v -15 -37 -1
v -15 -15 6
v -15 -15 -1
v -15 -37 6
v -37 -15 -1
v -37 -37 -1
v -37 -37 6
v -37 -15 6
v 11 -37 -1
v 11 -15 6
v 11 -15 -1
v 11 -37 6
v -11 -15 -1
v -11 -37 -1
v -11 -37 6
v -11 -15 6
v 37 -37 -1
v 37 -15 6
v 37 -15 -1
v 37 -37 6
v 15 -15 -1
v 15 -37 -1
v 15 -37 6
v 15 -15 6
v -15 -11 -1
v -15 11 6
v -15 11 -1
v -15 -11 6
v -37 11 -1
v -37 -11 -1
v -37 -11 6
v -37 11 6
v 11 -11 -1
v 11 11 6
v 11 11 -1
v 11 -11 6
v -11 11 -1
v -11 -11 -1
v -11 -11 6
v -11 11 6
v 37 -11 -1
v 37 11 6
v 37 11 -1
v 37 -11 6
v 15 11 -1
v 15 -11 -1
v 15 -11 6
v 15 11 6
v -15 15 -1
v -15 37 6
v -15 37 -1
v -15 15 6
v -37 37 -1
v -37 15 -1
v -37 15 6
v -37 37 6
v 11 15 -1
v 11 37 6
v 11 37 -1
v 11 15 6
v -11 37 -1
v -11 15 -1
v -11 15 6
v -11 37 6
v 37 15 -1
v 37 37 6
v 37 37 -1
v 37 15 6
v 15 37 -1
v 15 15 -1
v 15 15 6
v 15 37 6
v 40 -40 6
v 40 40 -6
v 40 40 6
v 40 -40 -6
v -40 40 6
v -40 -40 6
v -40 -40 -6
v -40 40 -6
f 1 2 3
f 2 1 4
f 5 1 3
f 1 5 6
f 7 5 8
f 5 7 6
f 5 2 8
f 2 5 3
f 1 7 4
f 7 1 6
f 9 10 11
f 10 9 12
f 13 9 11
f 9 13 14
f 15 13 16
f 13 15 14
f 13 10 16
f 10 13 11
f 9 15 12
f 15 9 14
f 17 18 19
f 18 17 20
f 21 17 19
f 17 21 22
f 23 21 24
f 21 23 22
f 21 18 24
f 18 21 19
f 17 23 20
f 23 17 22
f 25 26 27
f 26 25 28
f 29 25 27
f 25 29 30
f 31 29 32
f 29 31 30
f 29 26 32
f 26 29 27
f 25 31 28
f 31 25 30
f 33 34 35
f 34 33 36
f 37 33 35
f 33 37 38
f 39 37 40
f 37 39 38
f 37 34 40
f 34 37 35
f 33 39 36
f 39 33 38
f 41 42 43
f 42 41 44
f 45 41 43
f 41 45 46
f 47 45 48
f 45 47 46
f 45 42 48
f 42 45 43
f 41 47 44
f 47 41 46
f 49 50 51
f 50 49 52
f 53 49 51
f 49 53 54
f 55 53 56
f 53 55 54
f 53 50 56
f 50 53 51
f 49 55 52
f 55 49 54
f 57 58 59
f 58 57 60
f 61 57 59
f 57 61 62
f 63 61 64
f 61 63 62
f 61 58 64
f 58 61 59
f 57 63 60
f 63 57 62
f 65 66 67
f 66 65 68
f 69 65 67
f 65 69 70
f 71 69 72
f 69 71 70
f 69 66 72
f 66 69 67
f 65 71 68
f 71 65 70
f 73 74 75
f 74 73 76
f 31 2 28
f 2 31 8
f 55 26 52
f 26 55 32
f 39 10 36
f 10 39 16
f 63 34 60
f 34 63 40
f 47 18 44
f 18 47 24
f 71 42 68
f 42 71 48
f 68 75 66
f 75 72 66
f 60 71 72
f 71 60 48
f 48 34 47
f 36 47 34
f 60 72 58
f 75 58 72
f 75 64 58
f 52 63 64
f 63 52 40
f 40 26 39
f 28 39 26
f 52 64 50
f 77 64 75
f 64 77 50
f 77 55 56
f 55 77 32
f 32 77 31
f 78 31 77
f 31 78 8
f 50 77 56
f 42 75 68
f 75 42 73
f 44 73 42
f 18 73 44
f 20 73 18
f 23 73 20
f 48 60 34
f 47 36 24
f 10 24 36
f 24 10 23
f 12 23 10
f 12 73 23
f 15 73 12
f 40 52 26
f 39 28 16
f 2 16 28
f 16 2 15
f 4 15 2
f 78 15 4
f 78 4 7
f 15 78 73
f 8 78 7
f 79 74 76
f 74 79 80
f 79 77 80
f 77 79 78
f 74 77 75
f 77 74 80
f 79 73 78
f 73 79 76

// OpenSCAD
$fn = 32;

// ----------------------------------------------------------------------
// Pocket plate 80 x 80 x 12
// 3 x 3 pockets 22 mm square, 7 mm deep
// ----------------------------------------------------------------------

// --- parameters (mm) ---
thickness = 12;  // plate thickness
floor_t = 5;     // material left under each pocket
pocket = 22;     // pocket side length
pitch_x = 26;    // pocket pitch along X
pitch_y = 26;    // pocket pitch along Y
cols = 3;        // pockets per row
rows = 3;        // rows of pockets

// --- derived feature positions (mm) ---
depth = thickness - floor_t;        // = 7   pocket depth, down to the floor
span_x = (cols - 1) * pitch_x;      // = 52   distance between outer pockets
span_y = (rows - 1) * pitch_y;      // = 52   distance between outer pocket rows
origin_x = -span_x / 2;             // = -26   X of the first pocket
origin_y = -span_y / 2;             // = -26   Y of the first pocket
plate = [span_x + pocket + 6, span_y + pocket + 6, thickness];  // = [80, 80, 12]   overall size: pockets plus 3 mm of wall on each side
feature_centers = [
  [origin_x + 0 * pitch_x, origin_y + 0 * pitch_y],
  [origin_x + 1 * pitch_x, origin_y + 0 * pitch_y],
  [origin_x + 2 * pitch_x, origin_y + 0 * pitch_y],
  [origin_x + 0 * pitch_x, origin_y + 1 * pitch_y],
  [origin_x + 1 * pitch_x, origin_y + 1 * pitch_y],
  [origin_x + 2 * pitch_x, origin_y + 1 * pitch_y],
  [origin_x + 0 * pitch_x, origin_y + 2 * pitch_y],
  [origin_x + 1 * pitch_x, origin_y + 2 * pitch_y],
  [origin_x + 2 * pitch_x, origin_y + 2 * pitch_y]
];   // pocket centres, used verbatim by the cutter loop

// plate outline, then one pocket per centre in feature_centers
difference() {
  cube(plate, center = true);
  for (centre = feature_centers)
    translate([centre[0] - pocket / 2, centre[1] - pocket / 2, plate[2] / 2 - depth])
      cube([pocket, pocket, depth + 1]);  // centred on the declared pocket centre
}
